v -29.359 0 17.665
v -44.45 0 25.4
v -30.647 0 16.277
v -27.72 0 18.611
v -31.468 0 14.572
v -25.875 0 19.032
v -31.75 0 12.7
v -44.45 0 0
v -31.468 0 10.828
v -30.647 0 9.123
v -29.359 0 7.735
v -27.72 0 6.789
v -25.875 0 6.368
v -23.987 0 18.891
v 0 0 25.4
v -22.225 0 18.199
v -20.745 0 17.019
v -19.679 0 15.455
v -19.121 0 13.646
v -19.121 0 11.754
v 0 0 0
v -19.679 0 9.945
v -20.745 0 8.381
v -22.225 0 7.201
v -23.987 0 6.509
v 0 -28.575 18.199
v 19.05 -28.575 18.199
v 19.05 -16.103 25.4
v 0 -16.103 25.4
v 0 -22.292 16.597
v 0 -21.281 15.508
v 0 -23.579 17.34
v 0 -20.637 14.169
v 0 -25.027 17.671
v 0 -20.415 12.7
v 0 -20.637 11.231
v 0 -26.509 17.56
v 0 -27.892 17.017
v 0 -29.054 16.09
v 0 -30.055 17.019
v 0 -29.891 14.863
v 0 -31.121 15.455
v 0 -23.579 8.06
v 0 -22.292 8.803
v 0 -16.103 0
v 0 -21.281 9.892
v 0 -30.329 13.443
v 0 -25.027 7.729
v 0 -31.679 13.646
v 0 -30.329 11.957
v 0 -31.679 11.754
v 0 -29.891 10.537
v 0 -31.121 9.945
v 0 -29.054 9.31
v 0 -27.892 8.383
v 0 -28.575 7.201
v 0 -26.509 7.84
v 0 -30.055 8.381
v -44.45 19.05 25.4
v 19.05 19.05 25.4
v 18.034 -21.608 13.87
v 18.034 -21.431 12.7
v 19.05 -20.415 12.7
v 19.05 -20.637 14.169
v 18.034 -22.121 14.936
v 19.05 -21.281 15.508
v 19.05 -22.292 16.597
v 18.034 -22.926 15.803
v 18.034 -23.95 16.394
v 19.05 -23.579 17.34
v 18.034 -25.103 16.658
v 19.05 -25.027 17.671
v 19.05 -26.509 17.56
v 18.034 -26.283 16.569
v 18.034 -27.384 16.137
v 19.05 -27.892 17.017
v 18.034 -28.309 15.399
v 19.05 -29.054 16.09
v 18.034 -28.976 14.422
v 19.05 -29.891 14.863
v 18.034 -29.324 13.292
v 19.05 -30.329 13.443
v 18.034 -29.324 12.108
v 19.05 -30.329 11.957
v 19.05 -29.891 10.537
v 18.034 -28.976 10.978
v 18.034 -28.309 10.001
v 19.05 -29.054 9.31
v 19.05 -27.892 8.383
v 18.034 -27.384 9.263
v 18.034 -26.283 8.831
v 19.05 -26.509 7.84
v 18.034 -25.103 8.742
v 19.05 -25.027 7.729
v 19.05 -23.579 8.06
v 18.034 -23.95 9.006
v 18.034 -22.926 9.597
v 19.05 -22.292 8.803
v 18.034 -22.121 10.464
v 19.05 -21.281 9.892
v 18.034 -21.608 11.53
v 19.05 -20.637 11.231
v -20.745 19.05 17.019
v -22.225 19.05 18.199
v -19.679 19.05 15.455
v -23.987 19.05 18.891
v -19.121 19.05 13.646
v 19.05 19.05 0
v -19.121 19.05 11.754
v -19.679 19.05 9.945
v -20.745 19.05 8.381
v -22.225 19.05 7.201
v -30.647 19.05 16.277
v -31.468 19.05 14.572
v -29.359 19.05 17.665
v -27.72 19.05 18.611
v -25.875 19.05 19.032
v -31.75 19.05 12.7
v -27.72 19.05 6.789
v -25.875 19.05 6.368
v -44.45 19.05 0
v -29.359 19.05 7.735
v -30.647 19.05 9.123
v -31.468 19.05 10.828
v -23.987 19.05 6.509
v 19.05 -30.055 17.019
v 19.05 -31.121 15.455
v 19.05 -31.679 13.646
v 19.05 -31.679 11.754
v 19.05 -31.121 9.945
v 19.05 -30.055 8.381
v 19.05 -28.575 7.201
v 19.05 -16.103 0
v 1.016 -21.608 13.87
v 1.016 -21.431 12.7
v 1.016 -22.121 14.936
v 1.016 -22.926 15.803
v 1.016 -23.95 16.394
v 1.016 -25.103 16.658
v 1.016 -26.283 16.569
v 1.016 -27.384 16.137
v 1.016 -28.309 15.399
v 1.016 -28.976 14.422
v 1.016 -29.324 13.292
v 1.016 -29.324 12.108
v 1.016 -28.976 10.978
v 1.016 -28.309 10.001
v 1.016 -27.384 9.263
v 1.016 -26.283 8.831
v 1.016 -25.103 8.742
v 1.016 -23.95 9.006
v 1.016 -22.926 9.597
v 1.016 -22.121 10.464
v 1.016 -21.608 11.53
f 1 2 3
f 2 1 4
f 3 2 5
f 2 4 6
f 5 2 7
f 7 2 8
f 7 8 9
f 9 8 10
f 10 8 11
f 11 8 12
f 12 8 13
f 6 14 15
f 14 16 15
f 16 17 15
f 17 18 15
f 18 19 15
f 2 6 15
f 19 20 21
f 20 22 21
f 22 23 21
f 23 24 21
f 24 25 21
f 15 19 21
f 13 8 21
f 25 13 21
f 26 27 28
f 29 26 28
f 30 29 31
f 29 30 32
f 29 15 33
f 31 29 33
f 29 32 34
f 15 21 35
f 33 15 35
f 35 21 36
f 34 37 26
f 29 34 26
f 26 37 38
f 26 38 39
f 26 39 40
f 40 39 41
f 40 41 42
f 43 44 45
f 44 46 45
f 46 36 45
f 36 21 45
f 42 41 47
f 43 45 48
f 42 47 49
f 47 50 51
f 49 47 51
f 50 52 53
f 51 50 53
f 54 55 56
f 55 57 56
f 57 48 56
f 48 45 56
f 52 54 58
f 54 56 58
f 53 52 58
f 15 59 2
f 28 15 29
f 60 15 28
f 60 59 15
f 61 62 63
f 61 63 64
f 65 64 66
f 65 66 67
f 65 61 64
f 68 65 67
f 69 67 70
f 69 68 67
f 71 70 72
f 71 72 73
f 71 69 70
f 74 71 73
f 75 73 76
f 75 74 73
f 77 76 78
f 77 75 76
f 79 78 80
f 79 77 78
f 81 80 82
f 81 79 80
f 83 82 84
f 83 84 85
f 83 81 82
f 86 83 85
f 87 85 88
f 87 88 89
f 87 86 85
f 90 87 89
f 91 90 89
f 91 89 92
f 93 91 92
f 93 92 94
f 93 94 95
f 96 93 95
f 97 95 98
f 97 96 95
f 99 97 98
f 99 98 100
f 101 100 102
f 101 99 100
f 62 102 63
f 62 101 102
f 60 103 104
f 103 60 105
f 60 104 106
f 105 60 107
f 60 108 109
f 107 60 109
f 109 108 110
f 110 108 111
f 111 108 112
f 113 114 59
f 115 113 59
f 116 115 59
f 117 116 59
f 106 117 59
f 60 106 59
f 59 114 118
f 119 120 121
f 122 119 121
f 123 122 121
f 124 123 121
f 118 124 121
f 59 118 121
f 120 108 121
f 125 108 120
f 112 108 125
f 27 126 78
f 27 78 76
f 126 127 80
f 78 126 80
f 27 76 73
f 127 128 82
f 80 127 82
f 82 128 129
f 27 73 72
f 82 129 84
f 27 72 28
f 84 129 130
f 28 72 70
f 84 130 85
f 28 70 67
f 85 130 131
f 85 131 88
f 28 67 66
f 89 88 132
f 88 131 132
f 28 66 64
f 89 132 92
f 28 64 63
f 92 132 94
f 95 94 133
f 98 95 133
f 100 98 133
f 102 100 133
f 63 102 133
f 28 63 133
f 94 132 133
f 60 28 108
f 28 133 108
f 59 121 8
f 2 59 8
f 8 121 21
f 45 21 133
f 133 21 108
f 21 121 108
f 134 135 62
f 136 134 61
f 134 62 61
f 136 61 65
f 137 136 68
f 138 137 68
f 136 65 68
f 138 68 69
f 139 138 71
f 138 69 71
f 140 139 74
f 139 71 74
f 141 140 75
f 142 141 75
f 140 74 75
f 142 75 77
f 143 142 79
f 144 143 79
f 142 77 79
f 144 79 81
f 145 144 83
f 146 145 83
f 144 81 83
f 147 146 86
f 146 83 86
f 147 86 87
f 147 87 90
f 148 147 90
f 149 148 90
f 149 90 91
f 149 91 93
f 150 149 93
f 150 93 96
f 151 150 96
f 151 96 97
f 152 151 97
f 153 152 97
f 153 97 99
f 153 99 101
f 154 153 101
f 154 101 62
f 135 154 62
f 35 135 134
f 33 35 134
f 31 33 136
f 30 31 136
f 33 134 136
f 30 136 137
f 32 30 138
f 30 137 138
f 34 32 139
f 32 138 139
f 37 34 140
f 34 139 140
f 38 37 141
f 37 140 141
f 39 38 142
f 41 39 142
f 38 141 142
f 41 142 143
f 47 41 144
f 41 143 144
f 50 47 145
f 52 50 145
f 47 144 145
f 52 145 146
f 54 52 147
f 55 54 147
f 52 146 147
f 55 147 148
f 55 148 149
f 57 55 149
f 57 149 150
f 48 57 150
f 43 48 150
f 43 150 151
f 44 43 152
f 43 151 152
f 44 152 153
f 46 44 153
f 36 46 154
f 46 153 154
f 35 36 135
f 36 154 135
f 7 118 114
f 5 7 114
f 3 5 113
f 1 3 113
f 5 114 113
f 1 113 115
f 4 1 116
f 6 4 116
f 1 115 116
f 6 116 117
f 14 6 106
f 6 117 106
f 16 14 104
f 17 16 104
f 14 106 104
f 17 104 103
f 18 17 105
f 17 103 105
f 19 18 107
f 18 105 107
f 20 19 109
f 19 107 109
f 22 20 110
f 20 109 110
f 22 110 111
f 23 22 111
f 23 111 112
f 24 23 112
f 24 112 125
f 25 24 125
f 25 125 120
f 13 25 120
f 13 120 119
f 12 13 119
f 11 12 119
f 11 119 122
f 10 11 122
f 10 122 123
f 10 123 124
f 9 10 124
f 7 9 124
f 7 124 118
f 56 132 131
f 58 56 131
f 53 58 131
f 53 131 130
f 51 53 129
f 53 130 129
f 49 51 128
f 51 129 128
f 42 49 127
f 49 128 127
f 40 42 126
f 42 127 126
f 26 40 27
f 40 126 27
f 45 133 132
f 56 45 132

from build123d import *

# Parameters (mm, degrees)
F1_DEPTH = 25.4
F2_R     = 3.96875
F3_DEPTH = 63.501
F4_R     = 6.35
F5_DEPTH = 50.801
F6_SIZE  = 1.016


with BuildPart() as f1:
    # F0 (on Top) → F1 (new body)
    with BuildSketch(Plane.XY):
        Polygon((-44.45, 0), (0, 0), (0, -31.75), (19.05, -31.75), (19.05, 19.05), (-44.45, 19.05), align=None)
    extrude(amount=F1_DEPTH)

    # F2 (on face) → F3 (cut, through all)
    with BuildSketch(Plane.YZ.offset(19.05)):
        with BuildLine():
            ThreePointArc((-28.575, 7.200738686), (-31.75, 12.7), (-28.575, 18.199261314))
            Line((-28.575, 18.199261314), (-16.1029547439, 25.4))
            Line((-16.1029547439, 25.4), (-16.1029547439, 30.48))
            Line((-16.1029547439, 30.48), (-41.5029547439, 30.48))
            Line((-41.5029547439, 30.48), (-41.5029547439, -5.08))
            Line((-41.5029547439, -5.08), (-16.1029547439, -5.08))
            Line((-16.1029547439, -5.08), (-16.1029547439, 0))
            Line((-16.1029547439, 0), (-28.575, 7.200738686))
        make_face()
        with Locations((-25.4, 12.7)):
            Circle(F2_R)
    extrude(amount=-F3_DEPTH, mode=Mode.SUBTRACT)

    # F4 (on face) → F5 (cut, through all)
    with BuildSketch(Plane(origin=(0, 19.05, 0), x_dir=(-1, 0, 0), z_dir=(0, 1, 0))):
        with Locations((25.4, 12.7)):
            Circle(F4_R)
    extrude(amount=-F5_DEPTH, mode=Mode.SUBTRACT)

    # F6
    f6_edges = [f1.edges().sort_by_distance(p)[0] for p in [
        (19.05, -29.36875, 12.7),
        (9.525, -21.43125, 12.7),
        (0, -29.36875, 12.7),
    ]]
    chamfer(f6_edges, length=F6_SIZE)


solid = f1.part
